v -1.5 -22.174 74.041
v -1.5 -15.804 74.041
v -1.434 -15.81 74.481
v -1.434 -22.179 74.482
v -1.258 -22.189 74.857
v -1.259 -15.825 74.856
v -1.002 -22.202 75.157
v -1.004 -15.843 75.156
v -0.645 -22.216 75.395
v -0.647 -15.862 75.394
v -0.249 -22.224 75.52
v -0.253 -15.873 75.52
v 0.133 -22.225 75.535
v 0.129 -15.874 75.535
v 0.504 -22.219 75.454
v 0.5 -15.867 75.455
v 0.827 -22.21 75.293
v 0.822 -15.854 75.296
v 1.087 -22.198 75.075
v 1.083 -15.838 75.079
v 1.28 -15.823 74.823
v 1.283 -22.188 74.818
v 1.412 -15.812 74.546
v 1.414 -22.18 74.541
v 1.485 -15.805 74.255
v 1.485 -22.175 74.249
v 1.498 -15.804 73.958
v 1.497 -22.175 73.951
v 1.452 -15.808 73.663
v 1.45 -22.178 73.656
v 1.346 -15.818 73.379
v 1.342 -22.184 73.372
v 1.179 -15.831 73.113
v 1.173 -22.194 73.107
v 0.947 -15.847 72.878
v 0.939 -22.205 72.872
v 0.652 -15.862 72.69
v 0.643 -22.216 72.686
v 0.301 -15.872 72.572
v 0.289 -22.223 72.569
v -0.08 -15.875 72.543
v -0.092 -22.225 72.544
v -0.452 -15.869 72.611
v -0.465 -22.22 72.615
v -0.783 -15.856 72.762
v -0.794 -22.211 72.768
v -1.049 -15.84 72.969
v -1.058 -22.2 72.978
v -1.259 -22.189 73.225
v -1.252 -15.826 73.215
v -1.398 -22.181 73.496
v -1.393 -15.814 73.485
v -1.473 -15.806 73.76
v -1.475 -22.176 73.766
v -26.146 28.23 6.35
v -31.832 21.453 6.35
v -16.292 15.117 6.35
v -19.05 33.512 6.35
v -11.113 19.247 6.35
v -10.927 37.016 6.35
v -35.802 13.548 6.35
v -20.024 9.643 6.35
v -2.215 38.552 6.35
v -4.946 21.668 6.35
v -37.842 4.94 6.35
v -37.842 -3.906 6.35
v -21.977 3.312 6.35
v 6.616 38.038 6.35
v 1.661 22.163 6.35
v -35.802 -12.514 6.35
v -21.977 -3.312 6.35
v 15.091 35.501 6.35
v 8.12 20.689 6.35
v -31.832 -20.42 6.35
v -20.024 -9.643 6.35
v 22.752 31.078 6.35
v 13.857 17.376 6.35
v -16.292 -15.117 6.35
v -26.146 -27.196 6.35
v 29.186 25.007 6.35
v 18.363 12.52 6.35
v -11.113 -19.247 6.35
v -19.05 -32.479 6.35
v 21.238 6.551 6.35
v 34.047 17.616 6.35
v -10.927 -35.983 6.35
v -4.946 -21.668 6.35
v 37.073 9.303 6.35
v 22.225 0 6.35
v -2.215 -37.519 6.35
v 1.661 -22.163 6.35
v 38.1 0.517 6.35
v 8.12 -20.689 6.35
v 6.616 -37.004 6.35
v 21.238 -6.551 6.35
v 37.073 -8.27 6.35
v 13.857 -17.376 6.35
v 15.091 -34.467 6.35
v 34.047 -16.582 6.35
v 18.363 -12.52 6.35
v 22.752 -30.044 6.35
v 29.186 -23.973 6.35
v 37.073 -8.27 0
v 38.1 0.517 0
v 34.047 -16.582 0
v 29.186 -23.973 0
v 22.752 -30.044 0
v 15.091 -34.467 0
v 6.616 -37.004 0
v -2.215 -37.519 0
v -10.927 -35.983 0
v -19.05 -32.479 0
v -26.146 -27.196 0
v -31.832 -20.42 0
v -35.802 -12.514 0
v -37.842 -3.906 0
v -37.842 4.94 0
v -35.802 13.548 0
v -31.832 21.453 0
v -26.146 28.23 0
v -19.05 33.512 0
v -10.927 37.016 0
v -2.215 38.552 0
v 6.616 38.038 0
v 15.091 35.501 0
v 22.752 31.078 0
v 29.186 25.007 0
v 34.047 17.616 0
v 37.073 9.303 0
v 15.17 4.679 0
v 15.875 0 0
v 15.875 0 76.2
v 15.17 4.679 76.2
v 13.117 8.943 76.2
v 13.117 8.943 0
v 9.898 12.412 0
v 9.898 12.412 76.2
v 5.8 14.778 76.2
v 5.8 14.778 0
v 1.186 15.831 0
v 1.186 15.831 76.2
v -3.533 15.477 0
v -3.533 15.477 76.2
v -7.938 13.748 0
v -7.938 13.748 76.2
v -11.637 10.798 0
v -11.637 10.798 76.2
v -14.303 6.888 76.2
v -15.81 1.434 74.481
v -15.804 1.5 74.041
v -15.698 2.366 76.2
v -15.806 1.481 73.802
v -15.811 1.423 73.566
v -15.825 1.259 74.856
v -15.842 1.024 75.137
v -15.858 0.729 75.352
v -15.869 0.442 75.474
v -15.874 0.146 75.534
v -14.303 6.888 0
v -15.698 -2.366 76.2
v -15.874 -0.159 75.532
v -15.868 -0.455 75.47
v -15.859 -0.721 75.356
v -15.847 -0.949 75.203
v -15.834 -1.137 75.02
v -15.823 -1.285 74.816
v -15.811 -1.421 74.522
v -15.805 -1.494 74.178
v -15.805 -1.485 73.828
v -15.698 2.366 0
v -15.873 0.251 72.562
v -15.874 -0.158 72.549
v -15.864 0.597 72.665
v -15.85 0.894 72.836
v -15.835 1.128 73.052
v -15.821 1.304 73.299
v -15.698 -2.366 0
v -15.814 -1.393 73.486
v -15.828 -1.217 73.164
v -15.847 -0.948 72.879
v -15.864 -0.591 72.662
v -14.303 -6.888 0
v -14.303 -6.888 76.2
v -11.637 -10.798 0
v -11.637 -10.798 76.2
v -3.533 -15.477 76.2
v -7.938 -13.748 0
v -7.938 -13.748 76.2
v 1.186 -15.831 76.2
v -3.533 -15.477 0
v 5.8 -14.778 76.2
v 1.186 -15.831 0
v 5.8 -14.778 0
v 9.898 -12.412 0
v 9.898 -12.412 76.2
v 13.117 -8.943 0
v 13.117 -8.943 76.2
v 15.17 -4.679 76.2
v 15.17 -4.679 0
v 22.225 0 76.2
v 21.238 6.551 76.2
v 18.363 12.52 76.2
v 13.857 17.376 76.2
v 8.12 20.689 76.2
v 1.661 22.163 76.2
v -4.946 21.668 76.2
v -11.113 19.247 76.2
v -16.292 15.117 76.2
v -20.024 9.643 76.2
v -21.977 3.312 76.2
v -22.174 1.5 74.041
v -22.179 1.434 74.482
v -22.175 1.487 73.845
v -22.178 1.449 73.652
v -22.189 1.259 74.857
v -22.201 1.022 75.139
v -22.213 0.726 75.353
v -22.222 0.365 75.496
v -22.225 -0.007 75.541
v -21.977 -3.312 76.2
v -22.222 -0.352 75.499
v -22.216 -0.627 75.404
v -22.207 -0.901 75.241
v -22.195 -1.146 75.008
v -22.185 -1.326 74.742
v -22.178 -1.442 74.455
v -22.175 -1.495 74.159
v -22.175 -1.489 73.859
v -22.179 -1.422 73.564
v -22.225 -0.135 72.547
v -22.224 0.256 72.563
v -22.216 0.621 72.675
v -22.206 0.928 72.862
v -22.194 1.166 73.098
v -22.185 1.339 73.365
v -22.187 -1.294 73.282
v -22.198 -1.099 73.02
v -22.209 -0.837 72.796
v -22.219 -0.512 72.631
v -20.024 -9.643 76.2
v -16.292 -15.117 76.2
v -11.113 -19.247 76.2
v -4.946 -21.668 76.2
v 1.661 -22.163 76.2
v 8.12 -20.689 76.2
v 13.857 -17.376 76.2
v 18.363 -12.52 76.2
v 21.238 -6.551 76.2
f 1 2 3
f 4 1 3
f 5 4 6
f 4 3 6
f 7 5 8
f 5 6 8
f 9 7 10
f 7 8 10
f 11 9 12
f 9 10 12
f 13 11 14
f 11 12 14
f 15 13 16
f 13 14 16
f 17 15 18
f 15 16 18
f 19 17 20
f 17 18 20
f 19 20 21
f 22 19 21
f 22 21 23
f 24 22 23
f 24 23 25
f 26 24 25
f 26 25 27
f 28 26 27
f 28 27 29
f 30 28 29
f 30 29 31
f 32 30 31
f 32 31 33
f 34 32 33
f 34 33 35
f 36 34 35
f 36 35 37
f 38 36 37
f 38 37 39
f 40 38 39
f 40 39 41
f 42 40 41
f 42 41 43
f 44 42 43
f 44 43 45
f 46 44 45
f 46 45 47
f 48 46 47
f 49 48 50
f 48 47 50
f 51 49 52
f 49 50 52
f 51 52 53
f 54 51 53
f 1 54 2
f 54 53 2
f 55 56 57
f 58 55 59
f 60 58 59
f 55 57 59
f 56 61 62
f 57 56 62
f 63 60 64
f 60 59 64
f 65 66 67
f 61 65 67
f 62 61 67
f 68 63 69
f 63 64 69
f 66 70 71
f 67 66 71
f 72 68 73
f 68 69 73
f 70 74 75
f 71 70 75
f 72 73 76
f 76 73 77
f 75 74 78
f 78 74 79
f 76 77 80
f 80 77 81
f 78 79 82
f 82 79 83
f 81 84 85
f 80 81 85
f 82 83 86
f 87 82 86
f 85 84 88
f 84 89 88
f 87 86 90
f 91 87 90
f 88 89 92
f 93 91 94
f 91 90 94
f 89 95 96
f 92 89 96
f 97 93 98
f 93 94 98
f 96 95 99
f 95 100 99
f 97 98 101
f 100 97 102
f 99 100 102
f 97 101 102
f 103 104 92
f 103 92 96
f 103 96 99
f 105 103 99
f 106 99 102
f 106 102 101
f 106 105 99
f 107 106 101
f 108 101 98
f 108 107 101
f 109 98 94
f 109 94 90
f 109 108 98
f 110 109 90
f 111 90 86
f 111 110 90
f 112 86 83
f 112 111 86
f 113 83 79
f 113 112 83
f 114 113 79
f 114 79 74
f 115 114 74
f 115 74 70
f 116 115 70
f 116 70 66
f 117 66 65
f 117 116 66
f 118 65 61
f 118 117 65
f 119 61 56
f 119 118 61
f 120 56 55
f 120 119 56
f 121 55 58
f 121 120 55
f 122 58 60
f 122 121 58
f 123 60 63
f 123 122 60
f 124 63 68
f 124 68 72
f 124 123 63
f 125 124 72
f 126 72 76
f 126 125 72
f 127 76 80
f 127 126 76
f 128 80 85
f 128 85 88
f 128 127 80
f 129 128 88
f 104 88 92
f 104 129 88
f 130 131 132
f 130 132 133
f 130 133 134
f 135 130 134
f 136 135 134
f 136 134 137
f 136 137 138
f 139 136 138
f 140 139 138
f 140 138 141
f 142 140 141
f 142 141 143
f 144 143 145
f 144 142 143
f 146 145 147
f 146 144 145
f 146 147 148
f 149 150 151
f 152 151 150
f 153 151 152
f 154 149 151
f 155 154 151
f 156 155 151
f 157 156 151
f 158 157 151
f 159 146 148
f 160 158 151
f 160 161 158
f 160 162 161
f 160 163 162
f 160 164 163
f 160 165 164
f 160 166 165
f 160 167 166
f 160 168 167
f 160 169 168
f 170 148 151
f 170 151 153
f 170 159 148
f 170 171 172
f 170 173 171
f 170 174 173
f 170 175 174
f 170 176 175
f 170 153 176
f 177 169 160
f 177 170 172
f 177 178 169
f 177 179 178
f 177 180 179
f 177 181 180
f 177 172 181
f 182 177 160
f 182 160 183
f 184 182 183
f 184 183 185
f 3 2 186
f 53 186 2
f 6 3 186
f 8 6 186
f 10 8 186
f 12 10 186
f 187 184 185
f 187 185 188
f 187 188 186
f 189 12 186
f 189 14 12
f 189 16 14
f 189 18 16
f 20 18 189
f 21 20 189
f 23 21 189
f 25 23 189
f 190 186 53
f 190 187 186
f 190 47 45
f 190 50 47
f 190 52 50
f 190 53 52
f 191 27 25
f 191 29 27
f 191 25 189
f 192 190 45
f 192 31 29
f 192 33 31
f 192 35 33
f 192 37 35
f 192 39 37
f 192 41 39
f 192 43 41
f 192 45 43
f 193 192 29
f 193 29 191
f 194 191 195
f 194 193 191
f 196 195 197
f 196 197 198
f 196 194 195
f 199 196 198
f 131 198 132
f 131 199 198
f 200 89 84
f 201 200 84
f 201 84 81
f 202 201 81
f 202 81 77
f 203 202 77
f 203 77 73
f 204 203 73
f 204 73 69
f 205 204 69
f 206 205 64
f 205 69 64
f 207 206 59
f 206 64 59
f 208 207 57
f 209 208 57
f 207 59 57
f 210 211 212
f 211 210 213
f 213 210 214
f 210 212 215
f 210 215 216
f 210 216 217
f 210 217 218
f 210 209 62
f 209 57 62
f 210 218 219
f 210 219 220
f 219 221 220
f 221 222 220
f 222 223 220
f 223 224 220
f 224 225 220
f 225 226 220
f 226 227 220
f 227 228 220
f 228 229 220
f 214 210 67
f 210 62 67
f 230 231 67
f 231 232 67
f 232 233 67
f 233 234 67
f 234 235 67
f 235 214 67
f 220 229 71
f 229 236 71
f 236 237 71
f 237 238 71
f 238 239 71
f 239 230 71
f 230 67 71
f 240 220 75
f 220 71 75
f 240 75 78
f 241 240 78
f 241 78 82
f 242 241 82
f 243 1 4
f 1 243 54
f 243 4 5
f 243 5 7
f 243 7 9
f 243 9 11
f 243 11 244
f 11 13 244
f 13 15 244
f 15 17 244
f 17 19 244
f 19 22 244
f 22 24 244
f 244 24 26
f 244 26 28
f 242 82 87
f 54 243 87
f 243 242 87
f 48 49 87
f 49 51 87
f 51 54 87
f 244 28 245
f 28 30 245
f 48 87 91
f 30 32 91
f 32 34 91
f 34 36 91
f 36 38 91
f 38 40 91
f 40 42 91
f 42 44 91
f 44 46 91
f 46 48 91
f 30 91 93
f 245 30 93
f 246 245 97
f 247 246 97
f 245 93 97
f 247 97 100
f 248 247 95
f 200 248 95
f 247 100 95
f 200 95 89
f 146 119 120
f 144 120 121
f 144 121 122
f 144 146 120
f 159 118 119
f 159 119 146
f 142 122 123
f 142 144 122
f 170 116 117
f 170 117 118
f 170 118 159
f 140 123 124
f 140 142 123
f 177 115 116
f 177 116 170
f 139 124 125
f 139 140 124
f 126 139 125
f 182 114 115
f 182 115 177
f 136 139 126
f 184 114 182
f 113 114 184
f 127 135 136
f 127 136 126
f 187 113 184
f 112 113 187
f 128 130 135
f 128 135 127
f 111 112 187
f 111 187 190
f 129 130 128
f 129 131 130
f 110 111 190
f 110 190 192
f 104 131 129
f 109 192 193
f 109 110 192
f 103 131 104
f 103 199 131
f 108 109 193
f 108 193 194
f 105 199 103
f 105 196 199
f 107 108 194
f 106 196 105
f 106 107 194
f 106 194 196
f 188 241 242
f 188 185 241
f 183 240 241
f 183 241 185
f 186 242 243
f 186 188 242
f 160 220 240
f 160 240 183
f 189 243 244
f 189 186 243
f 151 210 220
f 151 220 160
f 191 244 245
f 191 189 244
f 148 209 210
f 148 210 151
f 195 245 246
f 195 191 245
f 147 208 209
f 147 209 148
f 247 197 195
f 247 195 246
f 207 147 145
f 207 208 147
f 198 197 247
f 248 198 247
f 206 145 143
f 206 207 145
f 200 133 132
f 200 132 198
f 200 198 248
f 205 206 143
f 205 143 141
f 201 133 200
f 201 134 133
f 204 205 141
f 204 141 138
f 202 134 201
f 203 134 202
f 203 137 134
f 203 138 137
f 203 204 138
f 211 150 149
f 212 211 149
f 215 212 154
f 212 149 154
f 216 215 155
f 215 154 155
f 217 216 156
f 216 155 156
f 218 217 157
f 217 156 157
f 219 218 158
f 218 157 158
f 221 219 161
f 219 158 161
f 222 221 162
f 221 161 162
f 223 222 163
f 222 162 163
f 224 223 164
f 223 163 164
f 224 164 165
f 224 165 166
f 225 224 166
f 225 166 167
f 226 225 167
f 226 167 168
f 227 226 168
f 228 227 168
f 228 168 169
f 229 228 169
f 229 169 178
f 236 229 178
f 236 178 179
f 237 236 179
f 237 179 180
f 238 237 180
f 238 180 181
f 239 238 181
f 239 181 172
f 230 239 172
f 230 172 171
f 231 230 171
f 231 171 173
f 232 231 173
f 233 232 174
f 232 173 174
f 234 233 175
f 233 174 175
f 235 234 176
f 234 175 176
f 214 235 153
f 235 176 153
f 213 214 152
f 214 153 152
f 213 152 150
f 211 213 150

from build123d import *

# Parameters (mm, degrees)
F0_R            = 22.225
F0_R_2          = 15.875
F1_DEPTH        = 76.2
F2_R            = 1.5
F3_DEPTH        = 25
F3_COPIES_COUNT = 2
F3_COPIES_ANGLE = 90
F4_R            = 38.1
F4_R_2          = 22.225
F5_DEPTH        = 6.35


# Not quite as in the source:
# - a pattern or mirror of a feature is missing from the dataset's text; its kind, count and spacing are read off the source's solid


with BuildPart() as f1:
    # F0 (on Top) → F1 (new body)
    with BuildSketch(Plane.XY):
        Circle(F0_R)
        Circle(F0_R_2, mode=Mode.SUBTRACT)
    extrude(amount=F1_DEPTH)

    # F2 (on Right) → F3 (cut)
    with BuildSketch(Plane.YZ):
        with Locations((0, 74.041)):
            Circle(F2_R)
    f3 = extrude(amount=-F3_DEPTH, mode=Mode.SUBTRACT)

    # F3_copies: F3 ×2 about axis
    f3_copies_axis = Axis((0, 0, 0), (0, 0, 1))
    for i in range(1, F3_COPIES_COUNT):
        add(f3.rotate(f3_copies_axis, i * F3_COPIES_ANGLE / (F3_COPIES_COUNT - 1)), mode=Mode.SUBTRACT)

    # F4 (on face) → F5 (join)
    with BuildSketch(Plane(origin=(0, 0, 0), x_dir=(1, 0, 0), z_dir=(0, 0, -1))):
        with Locations((0, -0.5167627824)):
            Circle(F4_R)
        Circle(F4_R_2, mode=Mode.SUBTRACT)
    extrude(amount=-F5_DEPTH)


solid = f1.part
